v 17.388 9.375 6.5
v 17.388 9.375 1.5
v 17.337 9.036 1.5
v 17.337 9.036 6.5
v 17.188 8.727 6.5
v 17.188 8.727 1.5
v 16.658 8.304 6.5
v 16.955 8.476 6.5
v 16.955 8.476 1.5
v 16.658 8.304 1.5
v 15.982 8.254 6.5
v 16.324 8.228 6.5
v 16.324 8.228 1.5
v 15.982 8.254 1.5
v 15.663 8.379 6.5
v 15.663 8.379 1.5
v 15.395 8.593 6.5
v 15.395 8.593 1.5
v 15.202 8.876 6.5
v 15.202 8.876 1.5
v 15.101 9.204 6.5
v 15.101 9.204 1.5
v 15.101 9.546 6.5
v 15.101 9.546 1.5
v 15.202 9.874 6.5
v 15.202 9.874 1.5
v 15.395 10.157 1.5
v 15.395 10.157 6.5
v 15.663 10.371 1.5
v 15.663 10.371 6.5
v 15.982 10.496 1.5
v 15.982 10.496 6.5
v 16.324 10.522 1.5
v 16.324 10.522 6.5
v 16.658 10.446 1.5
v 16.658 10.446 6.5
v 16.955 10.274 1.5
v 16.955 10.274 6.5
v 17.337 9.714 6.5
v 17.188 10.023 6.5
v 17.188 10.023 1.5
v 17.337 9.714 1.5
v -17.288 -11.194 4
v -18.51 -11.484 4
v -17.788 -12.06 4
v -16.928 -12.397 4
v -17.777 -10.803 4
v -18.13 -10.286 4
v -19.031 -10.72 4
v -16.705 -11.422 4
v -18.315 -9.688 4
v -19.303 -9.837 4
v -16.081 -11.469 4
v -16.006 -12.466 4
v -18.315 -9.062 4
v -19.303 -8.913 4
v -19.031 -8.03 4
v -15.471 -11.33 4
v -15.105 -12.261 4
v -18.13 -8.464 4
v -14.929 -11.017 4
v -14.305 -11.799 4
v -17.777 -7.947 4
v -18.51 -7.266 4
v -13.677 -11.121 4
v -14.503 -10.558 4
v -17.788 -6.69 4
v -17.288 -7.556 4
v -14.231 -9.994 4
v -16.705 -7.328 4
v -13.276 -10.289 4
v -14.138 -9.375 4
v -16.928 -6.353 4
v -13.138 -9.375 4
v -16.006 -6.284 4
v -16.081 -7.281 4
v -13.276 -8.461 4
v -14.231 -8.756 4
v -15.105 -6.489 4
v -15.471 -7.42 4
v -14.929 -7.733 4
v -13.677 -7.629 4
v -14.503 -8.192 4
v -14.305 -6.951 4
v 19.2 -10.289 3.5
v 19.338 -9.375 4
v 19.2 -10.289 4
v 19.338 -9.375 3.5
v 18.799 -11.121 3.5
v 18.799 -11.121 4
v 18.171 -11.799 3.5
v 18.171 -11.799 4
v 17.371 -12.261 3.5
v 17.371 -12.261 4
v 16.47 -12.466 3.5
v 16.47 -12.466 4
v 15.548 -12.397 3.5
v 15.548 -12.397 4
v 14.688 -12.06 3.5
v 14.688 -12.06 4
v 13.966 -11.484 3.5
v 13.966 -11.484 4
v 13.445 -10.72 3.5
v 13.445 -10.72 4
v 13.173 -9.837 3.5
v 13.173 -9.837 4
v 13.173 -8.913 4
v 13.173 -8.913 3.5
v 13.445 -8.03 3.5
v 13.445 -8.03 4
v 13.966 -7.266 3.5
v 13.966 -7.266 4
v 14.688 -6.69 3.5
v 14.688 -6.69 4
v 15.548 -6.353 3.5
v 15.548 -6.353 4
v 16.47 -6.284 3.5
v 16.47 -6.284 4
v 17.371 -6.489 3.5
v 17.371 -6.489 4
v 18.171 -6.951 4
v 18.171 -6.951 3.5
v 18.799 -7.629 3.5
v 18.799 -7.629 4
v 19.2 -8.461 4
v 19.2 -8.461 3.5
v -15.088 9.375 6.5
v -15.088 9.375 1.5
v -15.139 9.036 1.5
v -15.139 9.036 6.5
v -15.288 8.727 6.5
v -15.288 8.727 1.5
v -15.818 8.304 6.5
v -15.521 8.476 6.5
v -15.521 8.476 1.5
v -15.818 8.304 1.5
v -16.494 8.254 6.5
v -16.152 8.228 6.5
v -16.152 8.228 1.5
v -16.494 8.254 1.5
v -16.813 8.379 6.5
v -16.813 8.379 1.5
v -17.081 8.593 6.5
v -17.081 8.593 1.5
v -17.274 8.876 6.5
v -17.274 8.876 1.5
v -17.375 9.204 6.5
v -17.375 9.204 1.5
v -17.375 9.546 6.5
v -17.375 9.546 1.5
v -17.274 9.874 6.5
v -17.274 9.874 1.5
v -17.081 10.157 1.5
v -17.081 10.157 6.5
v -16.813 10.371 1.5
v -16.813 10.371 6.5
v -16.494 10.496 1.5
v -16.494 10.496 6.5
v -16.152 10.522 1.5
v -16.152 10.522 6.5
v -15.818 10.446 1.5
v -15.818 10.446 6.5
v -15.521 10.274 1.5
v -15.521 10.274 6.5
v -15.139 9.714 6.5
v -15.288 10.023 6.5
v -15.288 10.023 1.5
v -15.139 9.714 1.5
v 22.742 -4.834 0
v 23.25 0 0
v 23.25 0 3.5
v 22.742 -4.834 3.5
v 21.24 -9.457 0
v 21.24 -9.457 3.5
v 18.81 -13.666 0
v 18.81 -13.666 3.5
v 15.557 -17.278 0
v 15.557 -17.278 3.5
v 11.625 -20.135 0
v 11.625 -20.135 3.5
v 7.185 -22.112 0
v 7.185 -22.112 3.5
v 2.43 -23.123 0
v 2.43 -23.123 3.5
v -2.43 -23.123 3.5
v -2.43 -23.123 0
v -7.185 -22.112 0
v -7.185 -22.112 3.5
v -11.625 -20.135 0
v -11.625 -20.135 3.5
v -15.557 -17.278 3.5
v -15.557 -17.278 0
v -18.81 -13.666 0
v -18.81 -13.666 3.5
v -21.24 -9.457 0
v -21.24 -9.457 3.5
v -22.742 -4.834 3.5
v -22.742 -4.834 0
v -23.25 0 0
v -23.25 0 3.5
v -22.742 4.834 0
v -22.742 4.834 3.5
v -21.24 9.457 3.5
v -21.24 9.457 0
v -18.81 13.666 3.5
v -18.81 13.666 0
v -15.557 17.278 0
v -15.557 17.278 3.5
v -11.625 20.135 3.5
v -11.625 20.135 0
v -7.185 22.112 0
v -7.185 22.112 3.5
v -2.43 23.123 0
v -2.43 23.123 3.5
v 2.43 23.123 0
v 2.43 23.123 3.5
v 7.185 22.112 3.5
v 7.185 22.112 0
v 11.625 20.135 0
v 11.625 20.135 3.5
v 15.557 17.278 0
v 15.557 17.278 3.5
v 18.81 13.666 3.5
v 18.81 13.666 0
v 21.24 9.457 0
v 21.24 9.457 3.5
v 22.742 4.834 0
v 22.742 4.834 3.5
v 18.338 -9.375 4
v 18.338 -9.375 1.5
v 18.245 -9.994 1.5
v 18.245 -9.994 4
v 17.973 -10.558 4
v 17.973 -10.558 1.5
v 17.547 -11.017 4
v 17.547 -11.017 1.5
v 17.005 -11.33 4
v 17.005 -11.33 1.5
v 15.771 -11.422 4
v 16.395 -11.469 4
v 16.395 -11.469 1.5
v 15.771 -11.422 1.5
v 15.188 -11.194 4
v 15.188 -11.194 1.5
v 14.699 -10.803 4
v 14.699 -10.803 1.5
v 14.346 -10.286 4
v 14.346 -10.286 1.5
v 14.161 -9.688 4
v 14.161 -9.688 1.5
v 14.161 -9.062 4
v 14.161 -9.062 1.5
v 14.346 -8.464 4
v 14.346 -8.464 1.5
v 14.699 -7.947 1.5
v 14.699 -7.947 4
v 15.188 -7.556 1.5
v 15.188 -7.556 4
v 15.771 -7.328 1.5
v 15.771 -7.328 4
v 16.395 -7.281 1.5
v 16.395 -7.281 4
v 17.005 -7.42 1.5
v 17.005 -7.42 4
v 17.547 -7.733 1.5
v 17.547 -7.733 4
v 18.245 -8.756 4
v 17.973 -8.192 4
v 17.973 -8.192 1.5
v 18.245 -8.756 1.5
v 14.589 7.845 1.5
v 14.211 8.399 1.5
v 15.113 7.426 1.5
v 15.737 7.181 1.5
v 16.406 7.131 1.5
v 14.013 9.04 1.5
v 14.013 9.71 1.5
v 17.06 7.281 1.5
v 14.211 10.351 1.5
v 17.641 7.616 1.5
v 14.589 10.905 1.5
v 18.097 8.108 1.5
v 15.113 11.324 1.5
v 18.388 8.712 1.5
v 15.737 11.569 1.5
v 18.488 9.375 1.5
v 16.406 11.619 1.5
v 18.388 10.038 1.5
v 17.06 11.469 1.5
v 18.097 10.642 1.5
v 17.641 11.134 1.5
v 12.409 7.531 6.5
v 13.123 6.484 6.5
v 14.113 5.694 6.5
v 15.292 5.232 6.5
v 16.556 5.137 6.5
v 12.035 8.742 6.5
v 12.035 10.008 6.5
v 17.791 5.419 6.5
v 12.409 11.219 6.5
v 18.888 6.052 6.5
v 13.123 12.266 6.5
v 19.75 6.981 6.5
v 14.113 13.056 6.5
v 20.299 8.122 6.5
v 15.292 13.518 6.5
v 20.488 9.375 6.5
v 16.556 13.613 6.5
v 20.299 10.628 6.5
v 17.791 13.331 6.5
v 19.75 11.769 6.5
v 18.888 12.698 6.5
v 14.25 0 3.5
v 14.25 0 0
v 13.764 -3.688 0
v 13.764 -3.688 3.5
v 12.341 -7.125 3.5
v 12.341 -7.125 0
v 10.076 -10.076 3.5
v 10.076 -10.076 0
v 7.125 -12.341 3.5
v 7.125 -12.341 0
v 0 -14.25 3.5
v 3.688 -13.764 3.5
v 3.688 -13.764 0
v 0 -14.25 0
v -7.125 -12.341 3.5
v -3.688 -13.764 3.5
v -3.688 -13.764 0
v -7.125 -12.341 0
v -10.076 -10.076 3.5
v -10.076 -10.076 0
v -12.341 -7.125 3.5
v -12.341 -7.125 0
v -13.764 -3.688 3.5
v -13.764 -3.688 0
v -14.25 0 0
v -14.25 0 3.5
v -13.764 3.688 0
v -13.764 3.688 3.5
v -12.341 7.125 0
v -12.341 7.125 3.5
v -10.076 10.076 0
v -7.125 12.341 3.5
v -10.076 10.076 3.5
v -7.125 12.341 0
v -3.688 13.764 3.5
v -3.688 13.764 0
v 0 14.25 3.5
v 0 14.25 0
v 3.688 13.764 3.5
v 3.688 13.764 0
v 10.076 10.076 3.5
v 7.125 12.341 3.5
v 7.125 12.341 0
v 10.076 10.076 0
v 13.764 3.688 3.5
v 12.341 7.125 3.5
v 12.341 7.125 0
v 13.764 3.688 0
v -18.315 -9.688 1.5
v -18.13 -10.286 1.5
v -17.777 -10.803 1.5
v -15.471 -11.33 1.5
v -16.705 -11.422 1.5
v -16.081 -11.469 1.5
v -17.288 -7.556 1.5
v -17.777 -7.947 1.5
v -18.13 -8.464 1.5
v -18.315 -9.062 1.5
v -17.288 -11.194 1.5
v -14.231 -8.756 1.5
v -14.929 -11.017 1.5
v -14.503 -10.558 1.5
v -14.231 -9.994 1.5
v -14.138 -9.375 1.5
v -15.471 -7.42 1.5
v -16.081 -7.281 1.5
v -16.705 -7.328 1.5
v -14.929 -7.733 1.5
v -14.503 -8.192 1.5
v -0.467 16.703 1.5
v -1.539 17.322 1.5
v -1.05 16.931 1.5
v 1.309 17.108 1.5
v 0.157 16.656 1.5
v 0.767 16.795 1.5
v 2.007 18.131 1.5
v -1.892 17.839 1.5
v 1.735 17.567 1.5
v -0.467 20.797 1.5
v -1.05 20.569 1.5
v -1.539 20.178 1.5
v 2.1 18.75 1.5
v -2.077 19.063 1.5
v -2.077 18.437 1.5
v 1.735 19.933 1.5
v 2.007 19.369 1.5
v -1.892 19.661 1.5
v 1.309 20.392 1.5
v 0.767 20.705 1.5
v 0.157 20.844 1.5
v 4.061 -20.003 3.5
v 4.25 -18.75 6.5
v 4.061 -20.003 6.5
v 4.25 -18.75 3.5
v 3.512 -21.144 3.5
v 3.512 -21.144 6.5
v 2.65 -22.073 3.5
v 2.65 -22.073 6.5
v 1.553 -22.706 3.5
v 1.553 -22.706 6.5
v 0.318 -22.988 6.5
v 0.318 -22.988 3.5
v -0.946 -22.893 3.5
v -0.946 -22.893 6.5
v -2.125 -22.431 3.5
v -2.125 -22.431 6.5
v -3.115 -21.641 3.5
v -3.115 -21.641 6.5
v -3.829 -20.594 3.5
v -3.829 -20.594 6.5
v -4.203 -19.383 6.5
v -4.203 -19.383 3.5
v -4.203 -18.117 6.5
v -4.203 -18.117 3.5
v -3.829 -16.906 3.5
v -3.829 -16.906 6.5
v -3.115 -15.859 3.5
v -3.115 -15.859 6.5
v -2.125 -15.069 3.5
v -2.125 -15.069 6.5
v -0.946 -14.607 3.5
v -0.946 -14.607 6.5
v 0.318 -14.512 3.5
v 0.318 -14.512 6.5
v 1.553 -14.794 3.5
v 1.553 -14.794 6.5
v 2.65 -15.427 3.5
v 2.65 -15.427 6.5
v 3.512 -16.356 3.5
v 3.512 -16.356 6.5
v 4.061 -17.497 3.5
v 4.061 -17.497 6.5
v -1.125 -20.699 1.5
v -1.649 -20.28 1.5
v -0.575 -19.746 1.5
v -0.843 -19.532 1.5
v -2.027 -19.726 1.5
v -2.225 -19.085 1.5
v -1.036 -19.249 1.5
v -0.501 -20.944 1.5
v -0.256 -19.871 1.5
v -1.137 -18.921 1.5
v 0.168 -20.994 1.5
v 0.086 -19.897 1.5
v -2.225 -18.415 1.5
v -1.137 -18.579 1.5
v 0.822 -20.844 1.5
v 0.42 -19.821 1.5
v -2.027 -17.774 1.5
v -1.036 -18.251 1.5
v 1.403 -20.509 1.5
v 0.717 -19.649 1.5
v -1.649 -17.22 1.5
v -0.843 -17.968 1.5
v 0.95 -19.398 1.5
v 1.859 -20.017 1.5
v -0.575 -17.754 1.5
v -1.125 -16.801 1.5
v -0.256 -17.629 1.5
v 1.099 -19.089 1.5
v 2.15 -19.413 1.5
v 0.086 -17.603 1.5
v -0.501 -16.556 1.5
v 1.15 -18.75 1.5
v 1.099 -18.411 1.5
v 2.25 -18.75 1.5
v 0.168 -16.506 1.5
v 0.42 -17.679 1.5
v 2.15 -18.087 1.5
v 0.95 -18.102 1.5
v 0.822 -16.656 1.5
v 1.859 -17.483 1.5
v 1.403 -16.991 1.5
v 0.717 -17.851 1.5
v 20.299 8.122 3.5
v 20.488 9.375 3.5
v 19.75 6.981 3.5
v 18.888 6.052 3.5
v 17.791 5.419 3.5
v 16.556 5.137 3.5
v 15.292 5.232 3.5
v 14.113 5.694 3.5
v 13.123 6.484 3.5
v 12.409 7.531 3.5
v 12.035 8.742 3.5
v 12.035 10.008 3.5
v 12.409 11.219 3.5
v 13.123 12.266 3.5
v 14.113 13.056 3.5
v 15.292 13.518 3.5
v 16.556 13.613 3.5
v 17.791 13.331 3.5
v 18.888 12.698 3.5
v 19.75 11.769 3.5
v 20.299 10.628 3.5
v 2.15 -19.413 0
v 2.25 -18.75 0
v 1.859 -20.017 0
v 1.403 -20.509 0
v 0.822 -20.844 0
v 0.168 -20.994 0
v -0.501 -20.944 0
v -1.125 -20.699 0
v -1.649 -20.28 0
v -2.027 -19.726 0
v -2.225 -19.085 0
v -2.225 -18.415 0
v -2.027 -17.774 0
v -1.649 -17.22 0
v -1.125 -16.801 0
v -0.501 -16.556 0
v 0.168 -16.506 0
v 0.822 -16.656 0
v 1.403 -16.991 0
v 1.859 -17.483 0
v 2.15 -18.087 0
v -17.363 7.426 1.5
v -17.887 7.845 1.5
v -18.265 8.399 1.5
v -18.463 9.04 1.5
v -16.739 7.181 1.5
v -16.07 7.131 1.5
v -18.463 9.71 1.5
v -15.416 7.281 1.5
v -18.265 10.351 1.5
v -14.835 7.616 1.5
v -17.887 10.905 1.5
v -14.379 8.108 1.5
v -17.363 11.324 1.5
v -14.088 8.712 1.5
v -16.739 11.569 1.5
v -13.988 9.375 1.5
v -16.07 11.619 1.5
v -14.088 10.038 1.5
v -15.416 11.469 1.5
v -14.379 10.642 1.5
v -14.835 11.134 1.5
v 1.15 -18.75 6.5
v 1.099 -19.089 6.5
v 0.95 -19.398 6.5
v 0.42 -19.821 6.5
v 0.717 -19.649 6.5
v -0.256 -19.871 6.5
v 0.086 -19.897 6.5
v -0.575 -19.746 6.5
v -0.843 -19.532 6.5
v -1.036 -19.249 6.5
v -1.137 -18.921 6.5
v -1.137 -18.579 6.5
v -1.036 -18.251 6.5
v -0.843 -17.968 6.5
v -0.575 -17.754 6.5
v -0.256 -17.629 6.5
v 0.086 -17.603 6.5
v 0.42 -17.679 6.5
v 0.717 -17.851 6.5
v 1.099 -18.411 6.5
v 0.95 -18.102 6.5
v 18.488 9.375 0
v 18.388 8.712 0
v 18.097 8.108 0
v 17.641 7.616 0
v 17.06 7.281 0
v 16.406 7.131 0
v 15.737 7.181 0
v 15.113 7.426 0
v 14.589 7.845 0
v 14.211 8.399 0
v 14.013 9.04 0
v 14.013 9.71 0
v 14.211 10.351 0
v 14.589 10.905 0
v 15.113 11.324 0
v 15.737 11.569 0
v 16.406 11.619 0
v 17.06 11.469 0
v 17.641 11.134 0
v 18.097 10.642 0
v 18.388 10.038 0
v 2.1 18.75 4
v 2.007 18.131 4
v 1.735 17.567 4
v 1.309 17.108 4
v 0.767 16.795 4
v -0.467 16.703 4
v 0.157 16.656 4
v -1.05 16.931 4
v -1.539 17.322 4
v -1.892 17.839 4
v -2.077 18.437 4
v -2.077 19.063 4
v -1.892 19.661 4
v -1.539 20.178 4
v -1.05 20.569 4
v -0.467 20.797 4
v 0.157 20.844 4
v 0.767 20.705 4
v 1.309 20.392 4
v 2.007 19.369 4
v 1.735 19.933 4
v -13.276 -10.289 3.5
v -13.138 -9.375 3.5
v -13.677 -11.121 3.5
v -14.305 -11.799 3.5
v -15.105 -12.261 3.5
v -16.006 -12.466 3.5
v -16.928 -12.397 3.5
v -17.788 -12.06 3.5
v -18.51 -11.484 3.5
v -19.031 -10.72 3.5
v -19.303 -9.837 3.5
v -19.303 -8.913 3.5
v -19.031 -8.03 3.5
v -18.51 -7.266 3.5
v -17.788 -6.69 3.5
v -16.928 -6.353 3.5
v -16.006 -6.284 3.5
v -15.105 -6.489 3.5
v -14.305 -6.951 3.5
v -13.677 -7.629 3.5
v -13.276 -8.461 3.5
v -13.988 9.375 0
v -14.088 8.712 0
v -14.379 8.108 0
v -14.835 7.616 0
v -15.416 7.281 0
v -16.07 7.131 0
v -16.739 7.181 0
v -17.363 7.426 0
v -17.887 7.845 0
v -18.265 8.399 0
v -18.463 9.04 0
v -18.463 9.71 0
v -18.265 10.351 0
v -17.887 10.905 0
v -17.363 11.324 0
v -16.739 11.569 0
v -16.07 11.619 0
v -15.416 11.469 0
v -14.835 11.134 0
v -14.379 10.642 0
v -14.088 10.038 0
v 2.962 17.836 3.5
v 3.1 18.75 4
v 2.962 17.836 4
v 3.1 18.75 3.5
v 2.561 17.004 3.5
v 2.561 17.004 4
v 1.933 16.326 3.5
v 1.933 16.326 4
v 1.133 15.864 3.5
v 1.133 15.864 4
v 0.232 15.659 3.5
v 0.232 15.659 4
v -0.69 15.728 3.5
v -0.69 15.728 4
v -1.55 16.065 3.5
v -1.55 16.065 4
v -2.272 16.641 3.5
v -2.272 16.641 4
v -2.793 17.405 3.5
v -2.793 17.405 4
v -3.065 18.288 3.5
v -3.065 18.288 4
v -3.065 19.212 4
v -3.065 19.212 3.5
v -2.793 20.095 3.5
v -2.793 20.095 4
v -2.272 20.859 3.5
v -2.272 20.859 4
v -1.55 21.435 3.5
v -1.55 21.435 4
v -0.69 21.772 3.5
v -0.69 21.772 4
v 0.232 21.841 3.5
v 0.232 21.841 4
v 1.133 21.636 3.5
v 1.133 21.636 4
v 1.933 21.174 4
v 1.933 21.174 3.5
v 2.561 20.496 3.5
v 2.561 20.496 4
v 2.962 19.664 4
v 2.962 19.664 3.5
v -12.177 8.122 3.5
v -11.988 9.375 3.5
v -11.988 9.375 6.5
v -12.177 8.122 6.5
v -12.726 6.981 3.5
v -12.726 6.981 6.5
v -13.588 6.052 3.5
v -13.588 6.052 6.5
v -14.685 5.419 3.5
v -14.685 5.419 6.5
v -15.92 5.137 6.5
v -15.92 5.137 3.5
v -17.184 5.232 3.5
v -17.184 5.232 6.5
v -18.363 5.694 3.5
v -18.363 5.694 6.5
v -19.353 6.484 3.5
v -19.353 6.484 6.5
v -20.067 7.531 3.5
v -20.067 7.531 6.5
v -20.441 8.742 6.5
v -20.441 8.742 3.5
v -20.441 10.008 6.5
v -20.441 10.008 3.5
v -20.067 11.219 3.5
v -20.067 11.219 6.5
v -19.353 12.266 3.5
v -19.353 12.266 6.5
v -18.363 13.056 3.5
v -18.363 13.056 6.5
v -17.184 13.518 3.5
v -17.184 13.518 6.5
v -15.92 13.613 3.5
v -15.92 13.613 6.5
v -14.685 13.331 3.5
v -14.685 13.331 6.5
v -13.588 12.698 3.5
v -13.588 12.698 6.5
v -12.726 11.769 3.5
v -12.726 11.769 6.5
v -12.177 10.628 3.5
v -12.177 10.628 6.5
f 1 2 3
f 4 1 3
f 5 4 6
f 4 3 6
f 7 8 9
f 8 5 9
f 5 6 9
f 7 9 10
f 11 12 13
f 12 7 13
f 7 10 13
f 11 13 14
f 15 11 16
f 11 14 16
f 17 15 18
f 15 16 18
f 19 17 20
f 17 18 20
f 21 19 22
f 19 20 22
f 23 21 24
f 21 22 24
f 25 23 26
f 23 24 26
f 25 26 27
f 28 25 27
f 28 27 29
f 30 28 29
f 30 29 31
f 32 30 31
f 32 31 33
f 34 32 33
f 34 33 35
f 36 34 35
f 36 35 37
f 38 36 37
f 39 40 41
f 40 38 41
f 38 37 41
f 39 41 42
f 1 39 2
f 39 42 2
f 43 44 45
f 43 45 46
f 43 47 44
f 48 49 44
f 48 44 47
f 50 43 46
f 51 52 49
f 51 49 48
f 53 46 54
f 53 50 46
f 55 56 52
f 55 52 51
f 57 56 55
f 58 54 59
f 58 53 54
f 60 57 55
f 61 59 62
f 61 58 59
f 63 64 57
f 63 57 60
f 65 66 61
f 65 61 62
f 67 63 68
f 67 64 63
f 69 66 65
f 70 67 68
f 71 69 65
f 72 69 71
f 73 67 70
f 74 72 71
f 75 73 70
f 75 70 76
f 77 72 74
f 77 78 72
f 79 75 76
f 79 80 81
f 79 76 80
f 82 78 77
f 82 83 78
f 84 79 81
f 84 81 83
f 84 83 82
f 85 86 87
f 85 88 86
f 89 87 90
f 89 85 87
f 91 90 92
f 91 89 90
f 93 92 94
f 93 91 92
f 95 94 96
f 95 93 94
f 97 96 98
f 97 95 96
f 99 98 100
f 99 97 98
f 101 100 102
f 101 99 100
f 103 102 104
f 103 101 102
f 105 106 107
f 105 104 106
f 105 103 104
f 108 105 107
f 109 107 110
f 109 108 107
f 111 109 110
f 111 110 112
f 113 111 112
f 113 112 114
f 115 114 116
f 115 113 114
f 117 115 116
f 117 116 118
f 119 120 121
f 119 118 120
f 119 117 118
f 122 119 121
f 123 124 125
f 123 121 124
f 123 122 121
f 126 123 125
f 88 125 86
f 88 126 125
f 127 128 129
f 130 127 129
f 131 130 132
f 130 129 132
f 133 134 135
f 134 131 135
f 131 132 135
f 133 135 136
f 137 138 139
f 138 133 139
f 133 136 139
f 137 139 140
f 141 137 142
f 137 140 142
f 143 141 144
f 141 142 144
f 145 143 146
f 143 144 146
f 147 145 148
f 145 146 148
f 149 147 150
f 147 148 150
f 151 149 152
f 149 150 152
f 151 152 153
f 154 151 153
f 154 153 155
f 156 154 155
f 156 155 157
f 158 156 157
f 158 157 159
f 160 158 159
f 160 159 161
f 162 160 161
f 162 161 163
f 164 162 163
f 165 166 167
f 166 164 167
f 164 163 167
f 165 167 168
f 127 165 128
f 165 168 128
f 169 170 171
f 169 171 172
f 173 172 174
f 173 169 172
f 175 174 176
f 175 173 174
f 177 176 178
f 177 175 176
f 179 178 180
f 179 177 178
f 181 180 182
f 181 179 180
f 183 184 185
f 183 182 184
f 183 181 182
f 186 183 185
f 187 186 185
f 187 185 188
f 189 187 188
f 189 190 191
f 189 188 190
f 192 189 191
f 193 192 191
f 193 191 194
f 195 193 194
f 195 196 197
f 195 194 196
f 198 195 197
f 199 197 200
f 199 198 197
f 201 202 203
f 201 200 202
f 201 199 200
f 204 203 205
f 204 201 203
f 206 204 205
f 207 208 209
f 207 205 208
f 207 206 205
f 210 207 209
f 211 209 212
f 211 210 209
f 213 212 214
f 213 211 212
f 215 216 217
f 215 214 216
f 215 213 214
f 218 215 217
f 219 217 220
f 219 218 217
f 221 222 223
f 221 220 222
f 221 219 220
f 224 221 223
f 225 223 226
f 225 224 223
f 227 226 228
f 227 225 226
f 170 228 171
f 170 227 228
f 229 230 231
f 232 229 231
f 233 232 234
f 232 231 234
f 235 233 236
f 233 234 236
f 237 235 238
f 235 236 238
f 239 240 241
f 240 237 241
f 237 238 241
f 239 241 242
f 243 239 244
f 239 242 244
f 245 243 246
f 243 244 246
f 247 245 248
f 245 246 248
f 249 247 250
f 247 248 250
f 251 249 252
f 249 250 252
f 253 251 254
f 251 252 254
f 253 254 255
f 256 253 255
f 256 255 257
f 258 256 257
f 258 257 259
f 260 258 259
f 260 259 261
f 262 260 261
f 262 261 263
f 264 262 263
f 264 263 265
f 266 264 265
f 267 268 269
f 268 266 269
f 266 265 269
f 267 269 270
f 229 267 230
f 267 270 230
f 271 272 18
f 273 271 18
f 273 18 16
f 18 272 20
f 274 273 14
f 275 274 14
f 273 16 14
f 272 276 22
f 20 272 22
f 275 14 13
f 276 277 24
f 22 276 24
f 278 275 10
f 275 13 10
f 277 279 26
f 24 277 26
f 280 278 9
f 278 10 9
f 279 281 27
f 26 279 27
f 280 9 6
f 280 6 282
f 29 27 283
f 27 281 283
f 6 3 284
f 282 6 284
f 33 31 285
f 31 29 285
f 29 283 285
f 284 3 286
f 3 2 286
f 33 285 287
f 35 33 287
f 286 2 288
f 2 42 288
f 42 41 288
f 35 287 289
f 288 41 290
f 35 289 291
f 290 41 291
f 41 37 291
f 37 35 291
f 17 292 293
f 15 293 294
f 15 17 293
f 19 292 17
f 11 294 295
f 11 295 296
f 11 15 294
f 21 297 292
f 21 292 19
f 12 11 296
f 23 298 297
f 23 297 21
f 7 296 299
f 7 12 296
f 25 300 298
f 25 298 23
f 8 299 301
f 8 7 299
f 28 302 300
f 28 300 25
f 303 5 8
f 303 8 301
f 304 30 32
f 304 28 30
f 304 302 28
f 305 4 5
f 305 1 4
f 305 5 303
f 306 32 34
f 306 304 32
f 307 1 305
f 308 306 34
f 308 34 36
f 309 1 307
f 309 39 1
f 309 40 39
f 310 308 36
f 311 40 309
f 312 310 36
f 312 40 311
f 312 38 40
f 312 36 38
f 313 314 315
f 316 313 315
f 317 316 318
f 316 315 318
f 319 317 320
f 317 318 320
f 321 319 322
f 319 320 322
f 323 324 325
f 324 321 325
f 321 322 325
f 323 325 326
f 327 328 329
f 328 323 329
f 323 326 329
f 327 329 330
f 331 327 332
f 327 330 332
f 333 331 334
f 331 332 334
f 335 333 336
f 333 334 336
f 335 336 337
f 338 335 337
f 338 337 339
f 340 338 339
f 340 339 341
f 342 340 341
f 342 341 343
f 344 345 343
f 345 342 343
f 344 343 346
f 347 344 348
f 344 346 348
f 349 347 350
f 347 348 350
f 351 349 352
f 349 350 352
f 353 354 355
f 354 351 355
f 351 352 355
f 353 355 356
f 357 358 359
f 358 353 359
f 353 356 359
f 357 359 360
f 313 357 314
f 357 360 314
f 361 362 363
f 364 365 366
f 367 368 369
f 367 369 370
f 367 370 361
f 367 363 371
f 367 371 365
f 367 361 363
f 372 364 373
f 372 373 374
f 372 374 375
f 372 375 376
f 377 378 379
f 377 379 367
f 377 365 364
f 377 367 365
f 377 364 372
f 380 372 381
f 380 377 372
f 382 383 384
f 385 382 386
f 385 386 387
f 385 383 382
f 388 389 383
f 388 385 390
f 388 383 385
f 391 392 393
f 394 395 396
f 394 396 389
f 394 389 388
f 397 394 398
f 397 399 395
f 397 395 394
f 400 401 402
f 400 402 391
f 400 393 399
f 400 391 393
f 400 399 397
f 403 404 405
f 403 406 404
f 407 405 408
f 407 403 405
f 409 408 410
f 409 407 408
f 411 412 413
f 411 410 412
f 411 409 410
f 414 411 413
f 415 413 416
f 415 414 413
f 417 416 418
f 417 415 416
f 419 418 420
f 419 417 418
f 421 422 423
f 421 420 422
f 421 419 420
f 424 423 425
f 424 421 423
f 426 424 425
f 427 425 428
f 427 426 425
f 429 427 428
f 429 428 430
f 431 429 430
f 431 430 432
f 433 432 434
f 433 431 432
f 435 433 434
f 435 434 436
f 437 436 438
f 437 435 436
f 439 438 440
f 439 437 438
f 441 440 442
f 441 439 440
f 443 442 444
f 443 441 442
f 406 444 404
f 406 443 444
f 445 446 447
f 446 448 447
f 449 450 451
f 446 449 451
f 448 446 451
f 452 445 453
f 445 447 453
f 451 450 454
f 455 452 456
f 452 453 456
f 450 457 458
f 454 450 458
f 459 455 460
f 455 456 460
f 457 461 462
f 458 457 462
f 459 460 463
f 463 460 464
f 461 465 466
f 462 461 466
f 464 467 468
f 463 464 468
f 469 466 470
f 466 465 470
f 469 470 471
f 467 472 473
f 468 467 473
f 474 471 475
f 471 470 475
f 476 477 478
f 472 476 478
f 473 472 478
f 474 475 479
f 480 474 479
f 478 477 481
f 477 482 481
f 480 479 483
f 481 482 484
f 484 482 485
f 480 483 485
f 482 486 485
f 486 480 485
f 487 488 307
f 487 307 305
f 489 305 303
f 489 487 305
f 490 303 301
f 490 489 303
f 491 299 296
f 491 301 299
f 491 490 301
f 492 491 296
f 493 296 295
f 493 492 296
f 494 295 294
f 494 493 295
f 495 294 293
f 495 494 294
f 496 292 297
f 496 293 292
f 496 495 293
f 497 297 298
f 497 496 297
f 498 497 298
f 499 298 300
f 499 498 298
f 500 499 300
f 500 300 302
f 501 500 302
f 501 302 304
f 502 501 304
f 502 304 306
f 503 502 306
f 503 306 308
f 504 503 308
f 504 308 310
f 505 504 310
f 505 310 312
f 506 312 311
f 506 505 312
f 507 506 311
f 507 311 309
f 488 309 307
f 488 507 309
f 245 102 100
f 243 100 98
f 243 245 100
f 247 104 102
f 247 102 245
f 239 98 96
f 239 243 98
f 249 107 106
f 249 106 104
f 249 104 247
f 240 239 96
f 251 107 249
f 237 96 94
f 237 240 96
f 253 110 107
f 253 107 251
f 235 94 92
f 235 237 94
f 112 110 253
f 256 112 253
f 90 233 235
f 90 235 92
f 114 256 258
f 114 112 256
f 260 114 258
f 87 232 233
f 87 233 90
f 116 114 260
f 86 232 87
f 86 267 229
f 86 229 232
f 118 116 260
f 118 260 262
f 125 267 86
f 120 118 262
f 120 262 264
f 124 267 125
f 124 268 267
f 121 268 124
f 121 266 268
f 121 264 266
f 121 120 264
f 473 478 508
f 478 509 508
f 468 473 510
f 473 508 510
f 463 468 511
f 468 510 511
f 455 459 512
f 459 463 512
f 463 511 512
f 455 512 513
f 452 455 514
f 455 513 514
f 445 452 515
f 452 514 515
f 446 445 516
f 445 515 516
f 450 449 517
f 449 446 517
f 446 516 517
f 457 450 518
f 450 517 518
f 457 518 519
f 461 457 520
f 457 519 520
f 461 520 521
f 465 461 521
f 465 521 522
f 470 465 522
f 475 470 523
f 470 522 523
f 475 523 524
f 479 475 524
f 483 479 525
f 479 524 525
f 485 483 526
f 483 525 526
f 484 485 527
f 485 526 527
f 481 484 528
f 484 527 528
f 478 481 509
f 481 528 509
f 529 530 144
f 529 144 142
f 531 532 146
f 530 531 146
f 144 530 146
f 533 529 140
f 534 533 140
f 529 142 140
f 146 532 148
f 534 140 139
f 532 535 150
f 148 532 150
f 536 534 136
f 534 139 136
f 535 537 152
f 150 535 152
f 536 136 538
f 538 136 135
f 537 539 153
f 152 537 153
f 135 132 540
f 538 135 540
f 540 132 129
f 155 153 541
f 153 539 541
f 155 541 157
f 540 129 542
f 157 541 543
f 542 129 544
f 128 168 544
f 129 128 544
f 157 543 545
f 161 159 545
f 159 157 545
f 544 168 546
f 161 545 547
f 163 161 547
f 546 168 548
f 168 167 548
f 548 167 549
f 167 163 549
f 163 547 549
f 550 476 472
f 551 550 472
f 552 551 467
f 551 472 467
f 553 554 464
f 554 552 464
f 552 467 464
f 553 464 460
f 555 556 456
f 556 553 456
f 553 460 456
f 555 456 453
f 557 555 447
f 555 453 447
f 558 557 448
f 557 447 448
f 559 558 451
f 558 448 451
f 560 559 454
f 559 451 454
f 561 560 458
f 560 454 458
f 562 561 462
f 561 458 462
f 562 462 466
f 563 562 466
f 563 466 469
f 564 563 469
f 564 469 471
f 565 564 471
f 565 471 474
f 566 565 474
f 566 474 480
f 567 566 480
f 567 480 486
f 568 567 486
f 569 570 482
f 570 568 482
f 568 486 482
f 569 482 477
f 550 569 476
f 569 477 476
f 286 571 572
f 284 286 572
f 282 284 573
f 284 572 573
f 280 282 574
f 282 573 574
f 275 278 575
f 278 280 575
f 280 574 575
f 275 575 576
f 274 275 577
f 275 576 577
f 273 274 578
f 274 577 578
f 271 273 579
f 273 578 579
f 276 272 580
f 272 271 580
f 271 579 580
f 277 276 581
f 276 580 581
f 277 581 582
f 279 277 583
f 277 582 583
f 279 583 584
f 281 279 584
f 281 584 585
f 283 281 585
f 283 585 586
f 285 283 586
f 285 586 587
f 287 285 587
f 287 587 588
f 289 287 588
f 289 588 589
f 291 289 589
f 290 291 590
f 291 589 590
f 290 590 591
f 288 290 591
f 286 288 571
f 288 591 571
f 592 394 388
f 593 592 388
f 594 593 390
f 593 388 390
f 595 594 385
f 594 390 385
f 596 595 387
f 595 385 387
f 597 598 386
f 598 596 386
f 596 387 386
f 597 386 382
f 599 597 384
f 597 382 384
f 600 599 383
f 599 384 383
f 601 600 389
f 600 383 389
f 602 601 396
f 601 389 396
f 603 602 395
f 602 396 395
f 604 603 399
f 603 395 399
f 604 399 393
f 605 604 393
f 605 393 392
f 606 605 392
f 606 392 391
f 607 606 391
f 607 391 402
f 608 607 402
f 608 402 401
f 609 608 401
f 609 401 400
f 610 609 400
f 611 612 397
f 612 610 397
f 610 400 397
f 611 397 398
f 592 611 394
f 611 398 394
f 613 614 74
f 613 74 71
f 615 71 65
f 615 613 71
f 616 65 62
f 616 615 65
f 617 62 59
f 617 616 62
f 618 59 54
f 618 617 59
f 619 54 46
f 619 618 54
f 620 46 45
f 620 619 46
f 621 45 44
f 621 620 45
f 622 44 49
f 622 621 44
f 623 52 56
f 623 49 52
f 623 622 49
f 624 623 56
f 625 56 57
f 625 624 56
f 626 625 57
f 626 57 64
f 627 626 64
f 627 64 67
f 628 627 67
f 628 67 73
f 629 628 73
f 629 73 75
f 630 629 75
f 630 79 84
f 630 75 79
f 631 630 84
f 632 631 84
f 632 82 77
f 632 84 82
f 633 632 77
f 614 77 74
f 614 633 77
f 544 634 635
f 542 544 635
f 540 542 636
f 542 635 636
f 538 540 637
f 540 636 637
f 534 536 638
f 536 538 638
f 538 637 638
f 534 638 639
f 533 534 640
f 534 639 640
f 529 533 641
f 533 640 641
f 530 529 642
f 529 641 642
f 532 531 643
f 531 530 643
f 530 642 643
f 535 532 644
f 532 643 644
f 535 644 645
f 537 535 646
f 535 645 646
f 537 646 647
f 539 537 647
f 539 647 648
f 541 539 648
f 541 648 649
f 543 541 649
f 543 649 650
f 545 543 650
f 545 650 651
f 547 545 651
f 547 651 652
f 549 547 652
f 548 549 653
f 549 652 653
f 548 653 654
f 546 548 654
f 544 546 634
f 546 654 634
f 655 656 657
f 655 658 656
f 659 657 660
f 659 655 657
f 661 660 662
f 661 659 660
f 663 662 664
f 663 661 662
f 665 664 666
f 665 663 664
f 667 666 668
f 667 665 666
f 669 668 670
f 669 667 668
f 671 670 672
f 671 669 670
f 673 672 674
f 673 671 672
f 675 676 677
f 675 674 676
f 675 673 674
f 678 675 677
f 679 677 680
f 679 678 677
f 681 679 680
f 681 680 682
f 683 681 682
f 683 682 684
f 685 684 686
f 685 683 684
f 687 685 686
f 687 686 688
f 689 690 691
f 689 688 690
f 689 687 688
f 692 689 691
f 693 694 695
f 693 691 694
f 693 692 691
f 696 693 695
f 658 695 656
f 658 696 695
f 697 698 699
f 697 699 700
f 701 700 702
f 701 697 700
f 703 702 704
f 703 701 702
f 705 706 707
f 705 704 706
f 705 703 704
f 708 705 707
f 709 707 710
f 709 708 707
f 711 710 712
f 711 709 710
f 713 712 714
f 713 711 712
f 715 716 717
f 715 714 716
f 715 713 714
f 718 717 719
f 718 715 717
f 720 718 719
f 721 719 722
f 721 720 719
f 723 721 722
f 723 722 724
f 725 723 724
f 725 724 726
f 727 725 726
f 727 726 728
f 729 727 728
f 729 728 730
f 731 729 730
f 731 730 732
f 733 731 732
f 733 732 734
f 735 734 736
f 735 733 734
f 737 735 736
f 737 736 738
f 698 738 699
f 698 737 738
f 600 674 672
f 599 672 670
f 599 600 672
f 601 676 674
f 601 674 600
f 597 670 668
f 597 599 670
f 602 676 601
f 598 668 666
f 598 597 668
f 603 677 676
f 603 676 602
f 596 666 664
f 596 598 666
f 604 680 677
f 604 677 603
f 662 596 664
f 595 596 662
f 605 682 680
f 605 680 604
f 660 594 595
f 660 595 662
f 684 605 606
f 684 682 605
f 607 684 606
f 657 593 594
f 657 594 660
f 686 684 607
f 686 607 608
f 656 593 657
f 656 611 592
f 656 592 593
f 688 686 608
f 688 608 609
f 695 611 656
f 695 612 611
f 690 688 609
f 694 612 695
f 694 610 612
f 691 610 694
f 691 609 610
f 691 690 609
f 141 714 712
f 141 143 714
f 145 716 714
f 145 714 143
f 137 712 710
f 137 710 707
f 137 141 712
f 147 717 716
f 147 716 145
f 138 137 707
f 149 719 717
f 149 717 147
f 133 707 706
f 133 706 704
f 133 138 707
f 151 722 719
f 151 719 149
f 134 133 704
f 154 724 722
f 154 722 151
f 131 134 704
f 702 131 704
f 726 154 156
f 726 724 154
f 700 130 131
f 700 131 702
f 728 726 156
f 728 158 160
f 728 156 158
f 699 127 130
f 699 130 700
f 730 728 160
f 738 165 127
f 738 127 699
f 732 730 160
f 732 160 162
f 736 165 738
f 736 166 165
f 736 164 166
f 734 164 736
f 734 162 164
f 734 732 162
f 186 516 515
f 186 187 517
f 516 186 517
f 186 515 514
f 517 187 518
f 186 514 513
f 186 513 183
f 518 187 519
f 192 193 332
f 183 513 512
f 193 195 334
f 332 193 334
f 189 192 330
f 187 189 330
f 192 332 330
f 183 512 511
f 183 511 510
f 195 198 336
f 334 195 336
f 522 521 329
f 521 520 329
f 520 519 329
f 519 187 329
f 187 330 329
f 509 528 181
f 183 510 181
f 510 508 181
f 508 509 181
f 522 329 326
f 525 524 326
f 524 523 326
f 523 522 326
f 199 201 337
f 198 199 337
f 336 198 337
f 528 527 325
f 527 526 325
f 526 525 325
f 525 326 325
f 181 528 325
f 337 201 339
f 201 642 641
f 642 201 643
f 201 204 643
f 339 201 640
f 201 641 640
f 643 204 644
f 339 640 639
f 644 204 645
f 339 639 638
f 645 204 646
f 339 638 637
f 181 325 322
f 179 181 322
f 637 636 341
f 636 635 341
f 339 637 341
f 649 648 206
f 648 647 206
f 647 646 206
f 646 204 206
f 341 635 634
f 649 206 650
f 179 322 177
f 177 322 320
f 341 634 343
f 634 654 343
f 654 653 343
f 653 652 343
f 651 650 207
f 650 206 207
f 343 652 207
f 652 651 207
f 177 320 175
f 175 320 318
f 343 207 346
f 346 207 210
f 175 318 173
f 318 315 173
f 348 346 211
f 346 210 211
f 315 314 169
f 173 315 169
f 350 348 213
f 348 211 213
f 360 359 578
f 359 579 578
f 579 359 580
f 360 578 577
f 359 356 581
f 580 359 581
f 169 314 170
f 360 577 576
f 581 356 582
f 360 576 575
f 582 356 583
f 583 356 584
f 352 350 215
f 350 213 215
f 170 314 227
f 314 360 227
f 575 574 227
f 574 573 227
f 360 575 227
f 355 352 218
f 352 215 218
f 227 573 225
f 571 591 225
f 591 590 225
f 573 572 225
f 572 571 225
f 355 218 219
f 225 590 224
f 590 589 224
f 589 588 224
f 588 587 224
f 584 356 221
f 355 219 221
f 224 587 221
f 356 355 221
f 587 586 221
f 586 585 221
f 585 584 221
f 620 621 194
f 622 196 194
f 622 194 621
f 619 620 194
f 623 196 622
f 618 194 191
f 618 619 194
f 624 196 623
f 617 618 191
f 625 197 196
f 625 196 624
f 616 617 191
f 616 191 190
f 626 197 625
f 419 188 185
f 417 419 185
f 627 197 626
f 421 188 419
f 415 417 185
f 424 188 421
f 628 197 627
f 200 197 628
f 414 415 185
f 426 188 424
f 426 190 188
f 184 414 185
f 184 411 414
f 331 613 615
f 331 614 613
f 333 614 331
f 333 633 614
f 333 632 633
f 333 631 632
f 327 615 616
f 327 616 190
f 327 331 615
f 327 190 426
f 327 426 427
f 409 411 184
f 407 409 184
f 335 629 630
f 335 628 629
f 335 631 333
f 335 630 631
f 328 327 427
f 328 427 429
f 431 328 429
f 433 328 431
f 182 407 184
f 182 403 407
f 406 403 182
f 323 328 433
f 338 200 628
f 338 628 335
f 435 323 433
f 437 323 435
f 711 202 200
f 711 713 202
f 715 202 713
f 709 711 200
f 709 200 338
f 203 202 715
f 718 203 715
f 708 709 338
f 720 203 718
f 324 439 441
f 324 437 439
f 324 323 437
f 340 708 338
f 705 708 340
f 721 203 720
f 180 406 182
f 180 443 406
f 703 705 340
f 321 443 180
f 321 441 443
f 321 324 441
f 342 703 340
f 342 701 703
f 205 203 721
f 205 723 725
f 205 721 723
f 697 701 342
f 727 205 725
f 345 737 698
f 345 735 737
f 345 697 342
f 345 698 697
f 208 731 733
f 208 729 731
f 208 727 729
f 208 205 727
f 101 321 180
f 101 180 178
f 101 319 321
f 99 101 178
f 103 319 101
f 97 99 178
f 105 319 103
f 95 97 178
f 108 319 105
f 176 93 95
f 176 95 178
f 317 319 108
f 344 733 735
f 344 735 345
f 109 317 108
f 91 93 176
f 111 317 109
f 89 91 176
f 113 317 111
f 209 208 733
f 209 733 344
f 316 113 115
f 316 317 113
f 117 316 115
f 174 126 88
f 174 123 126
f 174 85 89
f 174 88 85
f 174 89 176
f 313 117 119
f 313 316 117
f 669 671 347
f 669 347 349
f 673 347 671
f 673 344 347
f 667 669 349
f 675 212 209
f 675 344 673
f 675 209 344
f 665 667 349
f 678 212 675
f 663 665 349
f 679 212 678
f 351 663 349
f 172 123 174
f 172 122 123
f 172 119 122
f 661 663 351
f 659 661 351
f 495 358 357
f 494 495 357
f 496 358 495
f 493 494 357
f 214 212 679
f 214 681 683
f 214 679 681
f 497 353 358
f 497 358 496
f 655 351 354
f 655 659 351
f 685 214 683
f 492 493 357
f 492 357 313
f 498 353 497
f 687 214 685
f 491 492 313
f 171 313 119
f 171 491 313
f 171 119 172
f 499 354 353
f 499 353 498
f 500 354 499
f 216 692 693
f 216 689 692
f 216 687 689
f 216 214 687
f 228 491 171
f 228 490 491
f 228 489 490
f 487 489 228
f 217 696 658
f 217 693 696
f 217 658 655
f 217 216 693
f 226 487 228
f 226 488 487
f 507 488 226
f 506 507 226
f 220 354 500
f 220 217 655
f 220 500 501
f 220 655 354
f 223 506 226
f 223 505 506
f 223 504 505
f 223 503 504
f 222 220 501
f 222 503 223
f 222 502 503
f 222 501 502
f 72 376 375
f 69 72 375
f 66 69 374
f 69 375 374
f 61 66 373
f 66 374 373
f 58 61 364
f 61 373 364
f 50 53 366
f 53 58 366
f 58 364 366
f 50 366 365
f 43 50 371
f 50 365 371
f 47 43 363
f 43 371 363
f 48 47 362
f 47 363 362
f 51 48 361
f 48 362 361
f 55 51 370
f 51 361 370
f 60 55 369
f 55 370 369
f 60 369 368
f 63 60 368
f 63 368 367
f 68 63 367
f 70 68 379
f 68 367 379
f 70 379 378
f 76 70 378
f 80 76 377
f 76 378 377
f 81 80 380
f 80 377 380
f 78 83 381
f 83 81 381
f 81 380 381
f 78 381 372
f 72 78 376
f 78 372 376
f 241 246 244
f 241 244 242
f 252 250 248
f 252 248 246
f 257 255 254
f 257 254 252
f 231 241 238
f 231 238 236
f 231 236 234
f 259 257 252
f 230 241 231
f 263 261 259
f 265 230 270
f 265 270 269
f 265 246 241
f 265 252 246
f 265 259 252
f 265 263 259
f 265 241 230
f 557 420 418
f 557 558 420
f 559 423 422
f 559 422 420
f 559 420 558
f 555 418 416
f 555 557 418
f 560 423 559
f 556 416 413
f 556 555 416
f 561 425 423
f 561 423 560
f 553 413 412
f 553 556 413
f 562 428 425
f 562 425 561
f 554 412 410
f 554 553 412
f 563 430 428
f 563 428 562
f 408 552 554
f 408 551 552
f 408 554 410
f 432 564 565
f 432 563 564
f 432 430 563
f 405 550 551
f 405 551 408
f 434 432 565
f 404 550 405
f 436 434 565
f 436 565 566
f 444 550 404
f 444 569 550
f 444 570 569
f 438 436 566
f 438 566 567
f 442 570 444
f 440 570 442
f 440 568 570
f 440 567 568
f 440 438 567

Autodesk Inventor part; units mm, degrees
ref_plane "YZ Plane" through (0, 0, 0) normal (1, 0, 0) x (0, 1, 0)
ref_plane "XZ Plane" through (0, 0, 0) normal (0, 1, 0) x (-1, 0, 0)
ref_plane "XY Plane" through (0, 0, 0) normal (0, 0, 1) x (1, 0, 0)
sketch "Skizze1" plane through (0, 0, 0) normal (0, 0, 1) x (1, 0, 0)
  line L0 (-32.55, 0) -> (32.55, 0) construction
  circle A0 centre (0, 0) radius 18.75 construction
  circle A1 centre (0, 18.75) radius 2.1
  circle A2 centre (16.238, -9.375) radius 2.1
  circle A3 centre (-16.238, -9.375) radius 2.1
  line L1 (0, 32.55) -> (0, -32.55) construction
  line L2 (0, 0) -> (-16.238, -9.375) construction
  circle A4 centre (0, 0) radius 14.25
  circle A5 centre (0, 0) radius 23.25
  circle A6 centre (0, -18.75) radius 1.15
  circle A7 centre (16.238, 9.375) radius 1.15
  circle A8 centre (-16.238, 9.375) radius 1.15
  circle A9 centre (0, -18.75) radius 4.25
  circle A10 centre (-16.238, 9.375) radius 4.25
  circle A11 centre (16.238, 9.375) radius 4.25
  circle A12 centre (0, -18.75) radius 2.25
  circle A13 centre (-16.238, 9.375) radius 2.25
  circle A14 centre (16.238, 9.375) radius 2.25
  circle A15 centre (16.238, -9.375) radius 3.1
  circle A16 centre (0, 18.75) radius 3.1
  circle A17 centre (-16.238, -9.375) radius 3.1
  dimension "d0" = 37.5
  dimension "d1" = 4.2
  dimension "d2" = 30
  dimension "d3" = 4.5
  dimension "d4" = 4.5
  dimension "d9" = 2.3
  dimension "d14" = 2
  dimension "d15" = 4.5
  dimension "d18" = 1
extrude "Extrusion2" add sketch "Skizze1" along normal blind 1.5 contours A1 | A2 | A3 | A5 | A9 | A10 | A11 | A15 | A16 | A17
extrude "Extrusion1" add sketch "Skizze1" along normal blind 2 from surface at 1.5 contours A5 | A9 | A10 | A11 | A12 | A13 | A14 | A15 | A16 | A17
extrude "Extrusion3" add sketch "Skizze1" along normal blind 3 from surface at 3.5 contours A9 | A10 | A11 | A12 | A13 | A14
extrude "Extrusion4" add sketch "Skizze1" along normal blind 0.5 from surface at 3.5 contours A15 | A16 | A17
equation "\"d3\" = d4"
properties part number "PlanetaryHolderBottom"
